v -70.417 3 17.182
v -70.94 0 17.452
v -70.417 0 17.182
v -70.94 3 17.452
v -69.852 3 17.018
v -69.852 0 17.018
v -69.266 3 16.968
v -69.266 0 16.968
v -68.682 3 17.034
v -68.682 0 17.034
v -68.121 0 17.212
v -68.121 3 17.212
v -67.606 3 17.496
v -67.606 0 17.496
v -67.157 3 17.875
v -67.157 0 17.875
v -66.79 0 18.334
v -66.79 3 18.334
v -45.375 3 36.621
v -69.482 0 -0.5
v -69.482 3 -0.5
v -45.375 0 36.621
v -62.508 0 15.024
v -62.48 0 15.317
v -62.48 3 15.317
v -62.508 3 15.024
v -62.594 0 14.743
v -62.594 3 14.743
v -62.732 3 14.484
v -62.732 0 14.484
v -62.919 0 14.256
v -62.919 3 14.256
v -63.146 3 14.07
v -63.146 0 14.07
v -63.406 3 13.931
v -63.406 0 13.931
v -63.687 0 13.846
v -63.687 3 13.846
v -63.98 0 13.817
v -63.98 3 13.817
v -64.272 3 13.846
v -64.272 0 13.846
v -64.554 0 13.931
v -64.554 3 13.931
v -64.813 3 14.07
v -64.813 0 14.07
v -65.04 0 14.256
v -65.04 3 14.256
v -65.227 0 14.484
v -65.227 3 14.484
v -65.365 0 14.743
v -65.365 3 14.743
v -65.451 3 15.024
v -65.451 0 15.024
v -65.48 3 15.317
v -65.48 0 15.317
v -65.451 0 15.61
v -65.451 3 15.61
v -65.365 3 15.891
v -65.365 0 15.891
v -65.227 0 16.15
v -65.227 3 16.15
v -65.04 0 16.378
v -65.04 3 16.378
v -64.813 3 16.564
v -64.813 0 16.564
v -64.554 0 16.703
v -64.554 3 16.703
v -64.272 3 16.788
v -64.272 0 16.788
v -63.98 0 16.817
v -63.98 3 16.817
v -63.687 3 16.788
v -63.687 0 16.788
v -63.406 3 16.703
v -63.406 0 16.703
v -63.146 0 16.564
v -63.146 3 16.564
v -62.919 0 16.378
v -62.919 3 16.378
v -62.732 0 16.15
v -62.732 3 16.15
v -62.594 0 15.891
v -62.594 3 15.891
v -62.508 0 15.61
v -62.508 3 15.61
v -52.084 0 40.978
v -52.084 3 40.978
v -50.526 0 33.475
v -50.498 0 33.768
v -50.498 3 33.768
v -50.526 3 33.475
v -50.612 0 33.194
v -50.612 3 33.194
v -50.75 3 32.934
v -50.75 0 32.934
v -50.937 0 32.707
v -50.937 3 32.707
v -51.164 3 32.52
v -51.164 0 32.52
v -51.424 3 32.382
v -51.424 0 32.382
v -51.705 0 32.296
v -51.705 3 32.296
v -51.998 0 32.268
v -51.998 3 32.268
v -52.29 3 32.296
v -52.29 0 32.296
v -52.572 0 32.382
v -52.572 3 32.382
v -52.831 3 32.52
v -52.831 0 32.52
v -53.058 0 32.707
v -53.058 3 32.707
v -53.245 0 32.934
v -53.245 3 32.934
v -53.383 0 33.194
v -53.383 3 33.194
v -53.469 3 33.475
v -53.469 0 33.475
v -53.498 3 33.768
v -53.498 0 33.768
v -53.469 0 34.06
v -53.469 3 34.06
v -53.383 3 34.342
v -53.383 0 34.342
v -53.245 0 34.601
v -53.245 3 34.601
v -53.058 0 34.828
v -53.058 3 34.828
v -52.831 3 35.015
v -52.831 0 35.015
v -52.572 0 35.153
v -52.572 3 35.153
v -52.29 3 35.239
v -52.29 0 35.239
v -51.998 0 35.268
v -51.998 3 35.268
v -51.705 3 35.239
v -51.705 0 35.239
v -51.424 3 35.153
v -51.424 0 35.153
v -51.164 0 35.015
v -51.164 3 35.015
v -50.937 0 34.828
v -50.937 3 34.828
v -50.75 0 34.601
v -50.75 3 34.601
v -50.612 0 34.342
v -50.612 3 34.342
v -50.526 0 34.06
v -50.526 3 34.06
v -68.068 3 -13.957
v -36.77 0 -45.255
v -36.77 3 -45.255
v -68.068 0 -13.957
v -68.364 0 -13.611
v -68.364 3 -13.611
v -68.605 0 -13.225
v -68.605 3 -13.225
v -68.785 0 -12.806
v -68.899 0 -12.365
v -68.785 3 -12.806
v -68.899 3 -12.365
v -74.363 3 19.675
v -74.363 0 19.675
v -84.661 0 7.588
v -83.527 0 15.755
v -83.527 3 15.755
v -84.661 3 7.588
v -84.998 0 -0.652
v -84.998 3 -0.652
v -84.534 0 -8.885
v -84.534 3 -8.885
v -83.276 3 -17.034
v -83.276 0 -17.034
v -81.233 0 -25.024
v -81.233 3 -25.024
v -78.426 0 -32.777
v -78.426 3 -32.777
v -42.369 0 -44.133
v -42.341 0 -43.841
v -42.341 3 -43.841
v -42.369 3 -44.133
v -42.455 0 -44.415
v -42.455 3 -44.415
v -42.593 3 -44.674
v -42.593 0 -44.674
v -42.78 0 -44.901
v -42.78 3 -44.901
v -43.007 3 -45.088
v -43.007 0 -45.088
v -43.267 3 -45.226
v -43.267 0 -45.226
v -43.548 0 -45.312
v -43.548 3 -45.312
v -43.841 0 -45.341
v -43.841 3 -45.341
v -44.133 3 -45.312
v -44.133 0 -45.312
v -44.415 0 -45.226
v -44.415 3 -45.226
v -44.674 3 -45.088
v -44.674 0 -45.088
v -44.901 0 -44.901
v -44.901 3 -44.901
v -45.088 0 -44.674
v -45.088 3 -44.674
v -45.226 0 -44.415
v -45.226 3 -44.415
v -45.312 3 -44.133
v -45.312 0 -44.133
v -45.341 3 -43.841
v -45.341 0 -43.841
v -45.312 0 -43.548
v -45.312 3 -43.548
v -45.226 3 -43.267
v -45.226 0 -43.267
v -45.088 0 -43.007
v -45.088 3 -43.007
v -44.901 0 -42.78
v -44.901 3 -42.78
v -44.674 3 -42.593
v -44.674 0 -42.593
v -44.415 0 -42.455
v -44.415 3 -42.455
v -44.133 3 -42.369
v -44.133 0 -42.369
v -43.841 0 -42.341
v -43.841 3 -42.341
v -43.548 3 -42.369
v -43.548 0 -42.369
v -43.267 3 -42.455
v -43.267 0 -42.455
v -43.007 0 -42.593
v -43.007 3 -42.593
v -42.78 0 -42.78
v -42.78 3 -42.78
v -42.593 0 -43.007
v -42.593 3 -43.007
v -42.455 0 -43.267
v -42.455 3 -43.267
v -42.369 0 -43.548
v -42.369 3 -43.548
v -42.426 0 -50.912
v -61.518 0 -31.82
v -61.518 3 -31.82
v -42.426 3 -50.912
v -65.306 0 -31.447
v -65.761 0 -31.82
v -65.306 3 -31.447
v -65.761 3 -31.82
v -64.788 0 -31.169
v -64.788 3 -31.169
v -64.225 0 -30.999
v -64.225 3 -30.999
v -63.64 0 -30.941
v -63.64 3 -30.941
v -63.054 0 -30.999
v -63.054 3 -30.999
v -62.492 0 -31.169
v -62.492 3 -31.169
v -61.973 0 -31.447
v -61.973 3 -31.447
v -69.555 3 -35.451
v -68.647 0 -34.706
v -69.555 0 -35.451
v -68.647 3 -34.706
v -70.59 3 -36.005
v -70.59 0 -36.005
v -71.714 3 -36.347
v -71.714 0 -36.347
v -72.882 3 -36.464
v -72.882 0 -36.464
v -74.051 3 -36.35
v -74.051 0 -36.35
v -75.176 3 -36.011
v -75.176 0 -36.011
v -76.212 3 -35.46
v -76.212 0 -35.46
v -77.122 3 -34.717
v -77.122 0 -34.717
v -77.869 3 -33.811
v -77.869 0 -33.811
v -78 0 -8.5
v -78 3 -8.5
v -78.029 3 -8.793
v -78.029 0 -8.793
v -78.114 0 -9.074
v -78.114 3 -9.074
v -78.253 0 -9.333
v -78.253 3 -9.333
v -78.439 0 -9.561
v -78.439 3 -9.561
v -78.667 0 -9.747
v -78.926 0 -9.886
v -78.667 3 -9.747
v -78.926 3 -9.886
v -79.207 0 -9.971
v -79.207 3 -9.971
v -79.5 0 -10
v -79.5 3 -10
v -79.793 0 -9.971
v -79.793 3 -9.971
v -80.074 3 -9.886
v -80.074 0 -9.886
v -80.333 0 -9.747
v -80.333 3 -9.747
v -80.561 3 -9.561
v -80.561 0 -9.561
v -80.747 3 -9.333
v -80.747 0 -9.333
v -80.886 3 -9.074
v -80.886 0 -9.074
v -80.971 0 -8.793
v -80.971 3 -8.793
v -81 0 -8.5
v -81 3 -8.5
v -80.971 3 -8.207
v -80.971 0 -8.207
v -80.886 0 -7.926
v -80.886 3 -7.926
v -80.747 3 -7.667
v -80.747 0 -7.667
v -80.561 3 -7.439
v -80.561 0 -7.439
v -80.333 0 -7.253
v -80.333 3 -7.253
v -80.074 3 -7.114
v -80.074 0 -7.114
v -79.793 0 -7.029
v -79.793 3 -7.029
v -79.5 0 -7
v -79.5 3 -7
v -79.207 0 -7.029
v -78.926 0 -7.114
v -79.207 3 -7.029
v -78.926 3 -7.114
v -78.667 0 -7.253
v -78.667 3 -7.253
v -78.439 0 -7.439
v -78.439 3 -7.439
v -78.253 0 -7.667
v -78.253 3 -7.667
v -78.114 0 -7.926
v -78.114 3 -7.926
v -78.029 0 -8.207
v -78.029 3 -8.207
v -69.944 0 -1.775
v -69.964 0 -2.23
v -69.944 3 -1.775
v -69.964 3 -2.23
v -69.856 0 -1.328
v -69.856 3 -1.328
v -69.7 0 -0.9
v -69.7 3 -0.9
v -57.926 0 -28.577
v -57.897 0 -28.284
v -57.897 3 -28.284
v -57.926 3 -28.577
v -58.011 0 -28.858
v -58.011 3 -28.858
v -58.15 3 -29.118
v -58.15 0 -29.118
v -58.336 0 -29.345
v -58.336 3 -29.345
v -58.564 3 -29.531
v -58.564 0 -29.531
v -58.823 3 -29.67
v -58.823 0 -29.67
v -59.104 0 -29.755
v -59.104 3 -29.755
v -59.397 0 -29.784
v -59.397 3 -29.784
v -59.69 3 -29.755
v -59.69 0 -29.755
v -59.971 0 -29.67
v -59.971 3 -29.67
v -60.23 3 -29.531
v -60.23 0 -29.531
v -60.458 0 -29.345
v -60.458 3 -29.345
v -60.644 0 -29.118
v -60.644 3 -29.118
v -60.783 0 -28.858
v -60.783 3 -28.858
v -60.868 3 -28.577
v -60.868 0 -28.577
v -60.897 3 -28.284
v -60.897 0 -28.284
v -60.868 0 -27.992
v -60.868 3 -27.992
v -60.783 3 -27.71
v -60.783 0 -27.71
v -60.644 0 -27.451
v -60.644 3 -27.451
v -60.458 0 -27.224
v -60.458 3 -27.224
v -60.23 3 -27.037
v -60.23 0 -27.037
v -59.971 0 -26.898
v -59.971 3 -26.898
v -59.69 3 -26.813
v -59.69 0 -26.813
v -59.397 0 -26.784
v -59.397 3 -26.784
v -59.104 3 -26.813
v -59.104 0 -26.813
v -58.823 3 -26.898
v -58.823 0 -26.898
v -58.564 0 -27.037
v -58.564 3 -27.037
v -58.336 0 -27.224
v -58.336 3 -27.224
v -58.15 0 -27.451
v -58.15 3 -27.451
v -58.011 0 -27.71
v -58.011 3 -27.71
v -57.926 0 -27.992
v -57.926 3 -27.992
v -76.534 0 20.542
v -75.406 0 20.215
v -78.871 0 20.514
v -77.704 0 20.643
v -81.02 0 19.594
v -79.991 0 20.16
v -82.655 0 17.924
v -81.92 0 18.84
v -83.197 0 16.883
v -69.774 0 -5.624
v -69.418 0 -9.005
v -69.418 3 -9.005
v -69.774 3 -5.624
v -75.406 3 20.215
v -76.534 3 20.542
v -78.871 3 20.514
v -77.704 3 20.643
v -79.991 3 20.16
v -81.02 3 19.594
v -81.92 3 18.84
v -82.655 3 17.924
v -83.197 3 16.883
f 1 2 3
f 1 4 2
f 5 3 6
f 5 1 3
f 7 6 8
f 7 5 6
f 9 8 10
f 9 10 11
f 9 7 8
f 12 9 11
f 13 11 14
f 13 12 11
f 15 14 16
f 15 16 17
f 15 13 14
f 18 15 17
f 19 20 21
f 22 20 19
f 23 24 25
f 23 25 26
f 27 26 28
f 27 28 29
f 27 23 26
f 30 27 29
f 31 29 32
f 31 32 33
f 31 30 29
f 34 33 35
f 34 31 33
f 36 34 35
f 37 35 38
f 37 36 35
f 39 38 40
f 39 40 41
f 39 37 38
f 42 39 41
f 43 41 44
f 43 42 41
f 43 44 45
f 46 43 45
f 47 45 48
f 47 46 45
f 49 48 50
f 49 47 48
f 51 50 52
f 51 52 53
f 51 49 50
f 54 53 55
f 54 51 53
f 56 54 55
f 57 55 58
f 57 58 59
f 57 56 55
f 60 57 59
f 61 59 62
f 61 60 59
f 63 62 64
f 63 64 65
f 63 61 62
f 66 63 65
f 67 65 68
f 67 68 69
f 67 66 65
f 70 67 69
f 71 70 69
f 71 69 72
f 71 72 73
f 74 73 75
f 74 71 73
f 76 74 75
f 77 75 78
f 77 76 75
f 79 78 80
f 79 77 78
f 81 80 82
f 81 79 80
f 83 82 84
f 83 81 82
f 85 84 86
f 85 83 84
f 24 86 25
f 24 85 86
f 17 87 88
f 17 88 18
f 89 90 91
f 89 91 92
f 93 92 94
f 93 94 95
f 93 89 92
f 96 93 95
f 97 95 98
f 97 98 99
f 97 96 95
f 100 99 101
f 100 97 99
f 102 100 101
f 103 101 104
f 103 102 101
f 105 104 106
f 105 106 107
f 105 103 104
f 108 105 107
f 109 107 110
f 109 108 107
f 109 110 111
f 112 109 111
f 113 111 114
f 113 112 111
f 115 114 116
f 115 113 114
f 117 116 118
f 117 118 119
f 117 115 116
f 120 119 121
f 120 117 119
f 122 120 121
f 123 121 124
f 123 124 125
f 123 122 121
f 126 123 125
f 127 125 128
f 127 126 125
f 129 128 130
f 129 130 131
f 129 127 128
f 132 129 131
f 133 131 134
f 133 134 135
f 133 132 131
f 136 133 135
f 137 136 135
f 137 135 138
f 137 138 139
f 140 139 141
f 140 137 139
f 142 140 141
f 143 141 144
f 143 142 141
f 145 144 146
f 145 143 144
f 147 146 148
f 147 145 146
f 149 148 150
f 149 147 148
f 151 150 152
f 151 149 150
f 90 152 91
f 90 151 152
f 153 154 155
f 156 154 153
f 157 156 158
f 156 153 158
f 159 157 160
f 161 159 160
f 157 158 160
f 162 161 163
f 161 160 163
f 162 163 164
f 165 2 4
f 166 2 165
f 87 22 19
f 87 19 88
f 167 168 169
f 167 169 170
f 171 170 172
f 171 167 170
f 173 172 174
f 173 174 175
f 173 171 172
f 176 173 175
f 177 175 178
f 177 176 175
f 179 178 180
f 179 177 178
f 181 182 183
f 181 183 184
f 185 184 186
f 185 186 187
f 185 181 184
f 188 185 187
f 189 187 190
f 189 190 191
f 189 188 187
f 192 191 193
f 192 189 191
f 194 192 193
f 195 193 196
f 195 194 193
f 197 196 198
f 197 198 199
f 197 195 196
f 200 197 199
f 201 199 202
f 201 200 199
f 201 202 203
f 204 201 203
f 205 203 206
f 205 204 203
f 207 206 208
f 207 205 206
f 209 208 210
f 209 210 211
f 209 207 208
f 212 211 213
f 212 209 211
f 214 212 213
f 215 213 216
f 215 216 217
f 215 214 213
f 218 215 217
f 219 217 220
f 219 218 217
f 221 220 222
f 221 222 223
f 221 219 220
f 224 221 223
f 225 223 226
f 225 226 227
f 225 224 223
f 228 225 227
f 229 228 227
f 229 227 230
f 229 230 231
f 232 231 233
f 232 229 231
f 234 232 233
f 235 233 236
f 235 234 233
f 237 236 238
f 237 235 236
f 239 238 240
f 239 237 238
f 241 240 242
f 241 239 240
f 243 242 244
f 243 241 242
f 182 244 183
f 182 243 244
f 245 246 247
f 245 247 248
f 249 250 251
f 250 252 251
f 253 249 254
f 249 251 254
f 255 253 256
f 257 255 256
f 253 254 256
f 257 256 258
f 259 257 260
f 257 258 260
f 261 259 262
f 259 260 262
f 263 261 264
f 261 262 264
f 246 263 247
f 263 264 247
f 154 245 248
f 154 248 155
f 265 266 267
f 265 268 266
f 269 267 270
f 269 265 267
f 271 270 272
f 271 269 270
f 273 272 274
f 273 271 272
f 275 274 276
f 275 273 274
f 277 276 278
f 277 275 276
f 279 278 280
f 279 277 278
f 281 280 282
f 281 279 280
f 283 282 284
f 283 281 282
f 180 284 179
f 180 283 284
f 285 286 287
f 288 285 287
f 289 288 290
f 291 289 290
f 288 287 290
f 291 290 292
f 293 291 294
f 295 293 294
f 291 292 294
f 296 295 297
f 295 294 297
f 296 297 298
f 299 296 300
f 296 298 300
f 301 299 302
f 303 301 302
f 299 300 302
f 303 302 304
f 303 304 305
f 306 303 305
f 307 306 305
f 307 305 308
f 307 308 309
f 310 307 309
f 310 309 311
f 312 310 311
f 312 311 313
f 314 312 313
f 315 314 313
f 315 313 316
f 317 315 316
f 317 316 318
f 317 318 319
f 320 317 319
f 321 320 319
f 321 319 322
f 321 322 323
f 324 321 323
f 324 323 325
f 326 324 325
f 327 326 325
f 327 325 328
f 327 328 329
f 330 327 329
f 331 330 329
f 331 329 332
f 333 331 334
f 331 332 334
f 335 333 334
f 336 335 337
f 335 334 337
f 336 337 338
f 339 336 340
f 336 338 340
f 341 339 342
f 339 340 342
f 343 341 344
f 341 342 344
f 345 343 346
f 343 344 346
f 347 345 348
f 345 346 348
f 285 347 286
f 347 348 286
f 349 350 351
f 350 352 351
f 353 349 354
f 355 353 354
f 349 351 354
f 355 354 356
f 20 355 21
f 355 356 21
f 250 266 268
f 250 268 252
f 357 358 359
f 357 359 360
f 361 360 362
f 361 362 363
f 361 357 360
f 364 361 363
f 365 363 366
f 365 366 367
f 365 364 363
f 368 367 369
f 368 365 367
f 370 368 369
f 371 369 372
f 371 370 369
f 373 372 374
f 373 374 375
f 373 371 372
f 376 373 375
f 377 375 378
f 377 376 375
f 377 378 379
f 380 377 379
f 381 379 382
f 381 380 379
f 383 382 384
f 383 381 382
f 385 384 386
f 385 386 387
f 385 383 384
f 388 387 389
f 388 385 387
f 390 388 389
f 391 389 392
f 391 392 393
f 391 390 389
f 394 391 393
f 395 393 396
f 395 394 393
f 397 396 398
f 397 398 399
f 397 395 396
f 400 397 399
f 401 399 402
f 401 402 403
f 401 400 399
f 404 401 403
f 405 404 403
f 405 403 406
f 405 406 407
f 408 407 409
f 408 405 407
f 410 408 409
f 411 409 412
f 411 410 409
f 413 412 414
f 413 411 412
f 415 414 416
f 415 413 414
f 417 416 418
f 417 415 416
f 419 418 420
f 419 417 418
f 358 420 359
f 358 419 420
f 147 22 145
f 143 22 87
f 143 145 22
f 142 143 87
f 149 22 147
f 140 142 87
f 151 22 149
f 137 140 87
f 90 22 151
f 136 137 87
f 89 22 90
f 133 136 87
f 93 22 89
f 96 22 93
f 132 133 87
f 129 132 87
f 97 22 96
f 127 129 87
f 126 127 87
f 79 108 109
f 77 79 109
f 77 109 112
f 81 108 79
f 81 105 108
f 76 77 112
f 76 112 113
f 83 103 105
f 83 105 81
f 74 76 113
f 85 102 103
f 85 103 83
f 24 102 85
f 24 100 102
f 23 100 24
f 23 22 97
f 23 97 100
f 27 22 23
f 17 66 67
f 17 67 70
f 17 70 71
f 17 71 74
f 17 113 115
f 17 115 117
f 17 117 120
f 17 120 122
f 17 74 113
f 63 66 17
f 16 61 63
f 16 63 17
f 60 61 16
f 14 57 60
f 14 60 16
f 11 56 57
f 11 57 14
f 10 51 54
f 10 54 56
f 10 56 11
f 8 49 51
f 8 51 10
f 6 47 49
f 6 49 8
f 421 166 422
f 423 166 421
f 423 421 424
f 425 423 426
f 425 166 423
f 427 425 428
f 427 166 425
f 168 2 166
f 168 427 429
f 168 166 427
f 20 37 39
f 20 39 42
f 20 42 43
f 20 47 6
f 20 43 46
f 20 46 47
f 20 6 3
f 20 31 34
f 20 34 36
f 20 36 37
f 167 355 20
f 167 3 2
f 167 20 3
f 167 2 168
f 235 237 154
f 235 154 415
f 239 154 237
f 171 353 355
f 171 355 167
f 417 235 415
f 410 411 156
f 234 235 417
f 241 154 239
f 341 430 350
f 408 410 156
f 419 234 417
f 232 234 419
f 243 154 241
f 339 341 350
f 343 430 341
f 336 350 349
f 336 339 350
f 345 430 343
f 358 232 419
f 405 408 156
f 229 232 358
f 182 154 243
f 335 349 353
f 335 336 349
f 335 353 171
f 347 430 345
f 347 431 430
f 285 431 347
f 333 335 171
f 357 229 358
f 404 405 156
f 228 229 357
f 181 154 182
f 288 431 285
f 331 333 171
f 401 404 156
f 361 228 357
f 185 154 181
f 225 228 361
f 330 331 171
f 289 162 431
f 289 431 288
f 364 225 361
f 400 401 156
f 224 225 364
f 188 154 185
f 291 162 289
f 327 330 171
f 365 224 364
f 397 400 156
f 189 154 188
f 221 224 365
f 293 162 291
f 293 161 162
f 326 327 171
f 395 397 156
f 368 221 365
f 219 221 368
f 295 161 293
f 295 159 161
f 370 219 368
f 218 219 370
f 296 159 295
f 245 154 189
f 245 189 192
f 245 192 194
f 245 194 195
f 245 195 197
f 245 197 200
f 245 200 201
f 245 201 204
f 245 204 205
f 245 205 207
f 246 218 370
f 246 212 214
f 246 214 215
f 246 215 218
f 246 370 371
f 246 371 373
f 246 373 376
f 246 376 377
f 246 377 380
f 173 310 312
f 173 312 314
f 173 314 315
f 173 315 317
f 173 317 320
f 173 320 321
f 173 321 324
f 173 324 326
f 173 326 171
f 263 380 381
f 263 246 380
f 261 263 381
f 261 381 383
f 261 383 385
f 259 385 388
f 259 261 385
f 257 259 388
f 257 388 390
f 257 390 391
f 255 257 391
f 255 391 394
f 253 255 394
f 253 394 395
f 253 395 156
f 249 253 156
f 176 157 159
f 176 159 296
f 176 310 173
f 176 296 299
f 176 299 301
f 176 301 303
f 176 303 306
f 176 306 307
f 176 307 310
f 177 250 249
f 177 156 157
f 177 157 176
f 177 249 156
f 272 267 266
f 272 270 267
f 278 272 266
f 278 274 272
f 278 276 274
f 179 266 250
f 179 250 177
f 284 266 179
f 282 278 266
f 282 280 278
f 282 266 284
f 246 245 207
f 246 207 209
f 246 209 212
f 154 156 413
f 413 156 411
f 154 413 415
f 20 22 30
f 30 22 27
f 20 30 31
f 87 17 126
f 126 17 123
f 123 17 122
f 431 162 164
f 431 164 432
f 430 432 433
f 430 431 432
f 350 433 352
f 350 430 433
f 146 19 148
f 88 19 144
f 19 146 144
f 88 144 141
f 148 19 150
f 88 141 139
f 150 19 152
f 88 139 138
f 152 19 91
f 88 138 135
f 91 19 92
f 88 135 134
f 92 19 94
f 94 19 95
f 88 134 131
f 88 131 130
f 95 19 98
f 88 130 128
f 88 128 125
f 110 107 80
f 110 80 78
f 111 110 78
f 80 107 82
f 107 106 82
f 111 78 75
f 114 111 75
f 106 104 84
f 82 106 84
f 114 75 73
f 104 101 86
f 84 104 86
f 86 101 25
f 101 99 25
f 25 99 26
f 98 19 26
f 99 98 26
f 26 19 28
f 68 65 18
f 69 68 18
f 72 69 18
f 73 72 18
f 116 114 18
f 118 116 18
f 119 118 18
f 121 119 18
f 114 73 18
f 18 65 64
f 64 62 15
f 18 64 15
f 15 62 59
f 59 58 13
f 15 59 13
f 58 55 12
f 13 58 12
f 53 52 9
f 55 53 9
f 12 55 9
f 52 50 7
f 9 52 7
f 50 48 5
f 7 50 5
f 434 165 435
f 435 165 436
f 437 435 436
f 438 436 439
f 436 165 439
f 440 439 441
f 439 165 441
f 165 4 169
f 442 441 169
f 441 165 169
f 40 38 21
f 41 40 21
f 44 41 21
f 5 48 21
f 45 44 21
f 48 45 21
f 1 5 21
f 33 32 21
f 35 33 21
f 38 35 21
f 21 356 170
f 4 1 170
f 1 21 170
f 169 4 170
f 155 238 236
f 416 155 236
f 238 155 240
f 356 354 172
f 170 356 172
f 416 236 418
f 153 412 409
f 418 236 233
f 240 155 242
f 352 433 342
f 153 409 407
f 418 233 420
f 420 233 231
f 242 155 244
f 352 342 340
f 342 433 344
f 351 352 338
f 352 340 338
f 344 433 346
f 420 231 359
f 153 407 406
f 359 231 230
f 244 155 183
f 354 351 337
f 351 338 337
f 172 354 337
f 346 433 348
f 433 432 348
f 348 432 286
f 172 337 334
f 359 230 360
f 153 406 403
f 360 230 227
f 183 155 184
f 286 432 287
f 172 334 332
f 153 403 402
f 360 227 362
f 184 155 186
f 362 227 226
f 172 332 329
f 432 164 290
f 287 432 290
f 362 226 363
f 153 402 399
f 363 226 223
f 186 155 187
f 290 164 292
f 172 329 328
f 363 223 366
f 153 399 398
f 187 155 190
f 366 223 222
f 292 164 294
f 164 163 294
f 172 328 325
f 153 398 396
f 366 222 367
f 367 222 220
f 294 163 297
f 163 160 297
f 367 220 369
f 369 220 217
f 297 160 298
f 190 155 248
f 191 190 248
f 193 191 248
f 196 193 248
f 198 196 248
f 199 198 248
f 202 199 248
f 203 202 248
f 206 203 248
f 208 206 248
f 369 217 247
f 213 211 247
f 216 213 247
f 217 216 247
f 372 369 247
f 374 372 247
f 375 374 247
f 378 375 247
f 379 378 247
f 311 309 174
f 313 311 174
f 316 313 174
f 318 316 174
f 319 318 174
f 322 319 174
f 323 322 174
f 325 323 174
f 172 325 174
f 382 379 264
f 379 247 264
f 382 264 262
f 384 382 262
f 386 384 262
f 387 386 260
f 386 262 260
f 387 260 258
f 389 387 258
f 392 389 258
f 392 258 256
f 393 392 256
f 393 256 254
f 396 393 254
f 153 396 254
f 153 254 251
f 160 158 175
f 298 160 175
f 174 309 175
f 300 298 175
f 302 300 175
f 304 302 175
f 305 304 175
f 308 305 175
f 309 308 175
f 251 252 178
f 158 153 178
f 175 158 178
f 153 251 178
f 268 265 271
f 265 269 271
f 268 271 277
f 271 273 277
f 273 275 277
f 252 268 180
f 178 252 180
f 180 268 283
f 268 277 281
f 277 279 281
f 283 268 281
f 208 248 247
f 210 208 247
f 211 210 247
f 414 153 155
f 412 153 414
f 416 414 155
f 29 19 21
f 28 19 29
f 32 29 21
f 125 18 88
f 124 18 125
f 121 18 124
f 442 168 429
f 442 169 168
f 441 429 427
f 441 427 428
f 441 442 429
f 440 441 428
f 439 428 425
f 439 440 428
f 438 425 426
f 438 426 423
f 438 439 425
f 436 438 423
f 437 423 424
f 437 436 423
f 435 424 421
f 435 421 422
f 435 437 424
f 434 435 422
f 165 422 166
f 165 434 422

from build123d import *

# Parameters (mm, degrees)
SKETCH1_R           = 1.5
BOSS_EXTRUDE1_DEPTH = 3
FILLET1_R           = 6
FILLET2_R           = 3
CUT_EXTRUDE1_REACH  = 5
SKETCH2_R           = 1.5


with BuildPart() as part:
    # Sketch1 → Boss-Extrude1 (new body)
    with BuildSketch(Plane(origin=(0, 0, 0), x_dir=(1, 0, 0), z_dir=(0, 1, 0))):
        with BuildLine():
            Line((-74.629040009, 40.687914512), (-63.639610307, 29.69848481))
            Line((-63.639610307, 29.69848481), (-42.426406871, 50.911688245))
            Line((-42.426406871, 50.911688245), (-36.769552622, 45.254833996))
            Line((-36.769552622, 45.254833996), (-68.72500623, 13.299380388))
            ThreePointArc((-68.72500623, 13.299380388), (-69.616532676, 7.316992429), (-69.988296617, 1.279975229))
            Line((-69.988296617, 1.279975229), (-45.375058731, -36.621087439))
            Line((-45.375058731, -36.621087439), (-52.084423274, -40.978199719))
            Line((-52.084423274, -40.978199719), (-68.423594325, -15.81808268))
            Line((-68.423594325, -15.81808268), (-81.457709532, -24.282536066))
            ThreePointArc((-81.457709532, -24.282536066), (-84.534361106, 8.884919378), (-74.629040009, 40.687914512))
        make_face()
        with Locations((-43.840620434, 43.840620434)):
            Circle(SKETCH1_R, mode=Mode.SUBTRACT)
        with Locations((-59.39696962, 28.284271247)):
            Circle(SKETCH1_R, mode=Mode.SUBTRACT)
        with Locations((-51.997575213, -33.767620171)):
            Circle(SKETCH1_R, mode=Mode.SUBTRACT)
        with Locations((-63.979633983, -15.316867676)):
            Circle(SKETCH1_R, mode=Mode.SUBTRACT)
    extrude(amount=BOSS_EXTRUDE1_DEPTH)

    # Fillet1
    fillet1_edges = [part.edges().sort_by_distance(p)[0] for p in [
        (-74.629040009, 1.5, -40.687914512),
        (-81.457709532, 1.5, 24.282536066),
    ]]
    fillet(fillet1_edges, radius=FILLET1_R)

    # Fillet2
    fillet2_edges = [part.edges().sort_by_distance(p)[0] for p in [
        (-63.639610307, 1.5, -29.69848481),
        (-68.72500623, 1.5, -13.299380388),
        (-69.988296617, 1.5, -1.279975229),
        (-68.423594325, 1.5, 15.81808268),
    ]]
    fillet(fillet2_edges, radius=FILLET2_R)

    # Sketch2 → Cut-Extrude1 (cut, up to next)
    with BuildSketch(Plane(origin=(0, 3, 0), x_dir=(1, 0, 0), z_dir=(0, 1, 0)), mode=Mode.PRIVATE) as cut_extrude1_sk1:
        with Locations((-79.5, 8.5)):
            Circle(SKETCH2_R)
    cut_extrude1_tool1 = extrude(cut_extrude1_sk1.sketch, amount=-CUT_EXTRUDE1_REACH, mode=Mode.PRIVATE) & part.part
    add(cut_extrude1_tool1.solids().sort_by_distance((-79.5, 3, -8.5))[0], mode=Mode.SUBTRACT)


solid = part.part
